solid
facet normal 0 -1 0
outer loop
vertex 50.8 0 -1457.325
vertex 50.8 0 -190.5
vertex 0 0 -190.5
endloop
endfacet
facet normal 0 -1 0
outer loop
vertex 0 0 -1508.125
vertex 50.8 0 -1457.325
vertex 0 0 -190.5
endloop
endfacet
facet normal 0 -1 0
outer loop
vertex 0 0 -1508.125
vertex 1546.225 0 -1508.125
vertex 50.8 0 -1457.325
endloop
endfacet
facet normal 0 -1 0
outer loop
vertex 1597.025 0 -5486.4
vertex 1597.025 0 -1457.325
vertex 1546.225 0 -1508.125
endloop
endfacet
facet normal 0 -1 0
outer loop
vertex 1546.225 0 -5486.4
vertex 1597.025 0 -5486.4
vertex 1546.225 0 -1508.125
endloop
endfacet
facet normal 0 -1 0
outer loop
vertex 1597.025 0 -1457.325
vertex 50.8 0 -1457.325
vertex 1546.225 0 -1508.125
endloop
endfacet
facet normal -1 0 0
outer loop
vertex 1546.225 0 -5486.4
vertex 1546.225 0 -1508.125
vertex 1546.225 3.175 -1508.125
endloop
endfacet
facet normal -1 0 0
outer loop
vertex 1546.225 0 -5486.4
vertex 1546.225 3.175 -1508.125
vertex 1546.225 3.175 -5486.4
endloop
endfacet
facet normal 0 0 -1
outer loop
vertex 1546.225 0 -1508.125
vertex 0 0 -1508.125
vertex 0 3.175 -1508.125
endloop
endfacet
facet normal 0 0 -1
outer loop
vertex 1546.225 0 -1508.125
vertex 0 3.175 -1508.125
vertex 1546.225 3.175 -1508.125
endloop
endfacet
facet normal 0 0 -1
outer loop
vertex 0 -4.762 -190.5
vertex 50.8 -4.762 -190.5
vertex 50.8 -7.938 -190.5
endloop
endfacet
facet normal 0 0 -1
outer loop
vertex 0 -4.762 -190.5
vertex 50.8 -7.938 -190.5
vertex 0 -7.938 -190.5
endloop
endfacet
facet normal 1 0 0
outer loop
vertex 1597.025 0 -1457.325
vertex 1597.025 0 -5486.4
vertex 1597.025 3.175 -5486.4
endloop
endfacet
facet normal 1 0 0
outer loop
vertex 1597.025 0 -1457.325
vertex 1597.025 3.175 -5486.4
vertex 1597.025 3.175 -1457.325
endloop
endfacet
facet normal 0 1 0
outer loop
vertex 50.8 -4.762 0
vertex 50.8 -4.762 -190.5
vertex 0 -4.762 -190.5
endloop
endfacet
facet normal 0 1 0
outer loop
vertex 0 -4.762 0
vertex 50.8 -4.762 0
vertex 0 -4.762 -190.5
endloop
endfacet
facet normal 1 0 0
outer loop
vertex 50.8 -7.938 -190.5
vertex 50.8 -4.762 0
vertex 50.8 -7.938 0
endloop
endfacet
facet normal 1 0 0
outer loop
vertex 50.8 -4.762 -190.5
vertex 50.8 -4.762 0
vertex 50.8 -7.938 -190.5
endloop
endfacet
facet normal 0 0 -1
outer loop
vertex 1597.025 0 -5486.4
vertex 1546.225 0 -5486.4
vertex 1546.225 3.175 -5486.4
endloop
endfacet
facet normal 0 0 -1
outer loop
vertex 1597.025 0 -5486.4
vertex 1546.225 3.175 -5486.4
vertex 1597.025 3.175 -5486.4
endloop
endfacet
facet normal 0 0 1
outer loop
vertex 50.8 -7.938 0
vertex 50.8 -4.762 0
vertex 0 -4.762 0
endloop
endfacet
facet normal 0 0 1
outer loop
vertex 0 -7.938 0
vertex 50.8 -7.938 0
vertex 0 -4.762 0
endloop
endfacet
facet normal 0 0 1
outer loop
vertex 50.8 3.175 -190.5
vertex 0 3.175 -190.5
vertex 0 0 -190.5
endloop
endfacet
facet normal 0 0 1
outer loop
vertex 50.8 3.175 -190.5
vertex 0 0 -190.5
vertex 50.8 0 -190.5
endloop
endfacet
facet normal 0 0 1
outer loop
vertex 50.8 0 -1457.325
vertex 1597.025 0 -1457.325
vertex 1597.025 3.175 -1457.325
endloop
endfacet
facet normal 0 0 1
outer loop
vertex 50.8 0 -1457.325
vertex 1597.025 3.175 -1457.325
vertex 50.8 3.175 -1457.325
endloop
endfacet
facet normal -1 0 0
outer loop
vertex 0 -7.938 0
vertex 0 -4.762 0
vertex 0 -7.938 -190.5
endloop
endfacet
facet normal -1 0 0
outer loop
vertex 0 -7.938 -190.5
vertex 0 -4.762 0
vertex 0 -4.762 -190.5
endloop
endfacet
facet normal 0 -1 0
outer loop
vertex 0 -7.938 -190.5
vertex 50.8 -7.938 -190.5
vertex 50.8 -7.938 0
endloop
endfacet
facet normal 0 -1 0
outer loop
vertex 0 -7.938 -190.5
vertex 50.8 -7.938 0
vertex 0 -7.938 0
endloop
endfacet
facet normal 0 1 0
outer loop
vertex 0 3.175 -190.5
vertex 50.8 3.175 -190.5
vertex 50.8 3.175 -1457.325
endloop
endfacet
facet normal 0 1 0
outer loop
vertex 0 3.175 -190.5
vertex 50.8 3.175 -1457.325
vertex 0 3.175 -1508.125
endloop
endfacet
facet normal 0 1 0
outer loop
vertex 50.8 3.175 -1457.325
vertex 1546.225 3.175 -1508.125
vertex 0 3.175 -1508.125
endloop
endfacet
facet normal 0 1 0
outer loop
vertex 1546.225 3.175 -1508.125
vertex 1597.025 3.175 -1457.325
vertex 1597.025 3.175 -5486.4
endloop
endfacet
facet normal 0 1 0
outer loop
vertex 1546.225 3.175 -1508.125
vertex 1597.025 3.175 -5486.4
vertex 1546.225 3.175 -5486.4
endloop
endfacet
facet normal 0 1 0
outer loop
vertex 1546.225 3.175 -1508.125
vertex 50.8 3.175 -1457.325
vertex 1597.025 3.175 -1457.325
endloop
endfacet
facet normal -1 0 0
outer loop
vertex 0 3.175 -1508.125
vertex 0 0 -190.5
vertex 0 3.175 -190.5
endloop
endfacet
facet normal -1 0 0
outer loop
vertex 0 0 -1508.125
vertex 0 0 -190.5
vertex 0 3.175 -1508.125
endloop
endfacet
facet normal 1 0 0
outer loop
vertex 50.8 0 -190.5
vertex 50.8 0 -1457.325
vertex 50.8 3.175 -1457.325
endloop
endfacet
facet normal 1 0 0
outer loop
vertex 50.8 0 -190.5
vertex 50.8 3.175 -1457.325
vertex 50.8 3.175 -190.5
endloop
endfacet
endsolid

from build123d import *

# Parameters (mm, degrees)
BOSS_EXTRUDE1_DEPTH = 3.175
SKETCH2_W           = 50.8
SKETCH2_H           = 190.5
CUT_EXTRUDE1_DEPTH  = 5715.112695008
SKETCH4_W           = 50.8
SKETCH4_H           = 190.5
BOSS_EXTRUDE3_DEPTH = 3.175


with BuildPart() as part:
    # Sketch1 → Boss-Extrude1 (new body)
    with BuildSketch(Plane(origin=(0, 0, 0), x_dir=(1, 0, 0), z_dir=(0, 1, 0))):
        Polygon((0, 0), (0, 1508.125), (1546.225, 1508.125), (1546.225, 5486.4), (1597.025, 5486.4), (1597.025, 1457.325), (50.8, 1457.325), (50.8, 0), align=None)
    extrude(amount=BOSS_EXTRUDE1_DEPTH)

    # Sketch2 → Cut-Extrude1 (cut, through all)
    with BuildSketch(Plane(origin=(0, 3.175, 0), x_dir=(1, 0, 0), z_dir=(0, 1, 0))):
        with Locations((25.4, 95.25)):
            Rectangle(SKETCH2_W, SKETCH2_H)
    extrude(amount=-CUT_EXTRUDE1_DEPTH, mode=Mode.SUBTRACT)


with BuildPart() as body_2:
    # Sketch4 → Boss-Extrude3 (new body)
    with BuildSketch(Plane(origin=(0, -4.7625, 0), x_dir=(-1, 0, 0), z_dir=(0, -1, 0))):
        with Locations((-25.4, 95.25)):
            Rectangle(SKETCH4_W, SKETCH4_H)
    extrude(amount=BOSS_EXTRUDE3_DEPTH)


solid = Compound([part.part, body_2.part])
